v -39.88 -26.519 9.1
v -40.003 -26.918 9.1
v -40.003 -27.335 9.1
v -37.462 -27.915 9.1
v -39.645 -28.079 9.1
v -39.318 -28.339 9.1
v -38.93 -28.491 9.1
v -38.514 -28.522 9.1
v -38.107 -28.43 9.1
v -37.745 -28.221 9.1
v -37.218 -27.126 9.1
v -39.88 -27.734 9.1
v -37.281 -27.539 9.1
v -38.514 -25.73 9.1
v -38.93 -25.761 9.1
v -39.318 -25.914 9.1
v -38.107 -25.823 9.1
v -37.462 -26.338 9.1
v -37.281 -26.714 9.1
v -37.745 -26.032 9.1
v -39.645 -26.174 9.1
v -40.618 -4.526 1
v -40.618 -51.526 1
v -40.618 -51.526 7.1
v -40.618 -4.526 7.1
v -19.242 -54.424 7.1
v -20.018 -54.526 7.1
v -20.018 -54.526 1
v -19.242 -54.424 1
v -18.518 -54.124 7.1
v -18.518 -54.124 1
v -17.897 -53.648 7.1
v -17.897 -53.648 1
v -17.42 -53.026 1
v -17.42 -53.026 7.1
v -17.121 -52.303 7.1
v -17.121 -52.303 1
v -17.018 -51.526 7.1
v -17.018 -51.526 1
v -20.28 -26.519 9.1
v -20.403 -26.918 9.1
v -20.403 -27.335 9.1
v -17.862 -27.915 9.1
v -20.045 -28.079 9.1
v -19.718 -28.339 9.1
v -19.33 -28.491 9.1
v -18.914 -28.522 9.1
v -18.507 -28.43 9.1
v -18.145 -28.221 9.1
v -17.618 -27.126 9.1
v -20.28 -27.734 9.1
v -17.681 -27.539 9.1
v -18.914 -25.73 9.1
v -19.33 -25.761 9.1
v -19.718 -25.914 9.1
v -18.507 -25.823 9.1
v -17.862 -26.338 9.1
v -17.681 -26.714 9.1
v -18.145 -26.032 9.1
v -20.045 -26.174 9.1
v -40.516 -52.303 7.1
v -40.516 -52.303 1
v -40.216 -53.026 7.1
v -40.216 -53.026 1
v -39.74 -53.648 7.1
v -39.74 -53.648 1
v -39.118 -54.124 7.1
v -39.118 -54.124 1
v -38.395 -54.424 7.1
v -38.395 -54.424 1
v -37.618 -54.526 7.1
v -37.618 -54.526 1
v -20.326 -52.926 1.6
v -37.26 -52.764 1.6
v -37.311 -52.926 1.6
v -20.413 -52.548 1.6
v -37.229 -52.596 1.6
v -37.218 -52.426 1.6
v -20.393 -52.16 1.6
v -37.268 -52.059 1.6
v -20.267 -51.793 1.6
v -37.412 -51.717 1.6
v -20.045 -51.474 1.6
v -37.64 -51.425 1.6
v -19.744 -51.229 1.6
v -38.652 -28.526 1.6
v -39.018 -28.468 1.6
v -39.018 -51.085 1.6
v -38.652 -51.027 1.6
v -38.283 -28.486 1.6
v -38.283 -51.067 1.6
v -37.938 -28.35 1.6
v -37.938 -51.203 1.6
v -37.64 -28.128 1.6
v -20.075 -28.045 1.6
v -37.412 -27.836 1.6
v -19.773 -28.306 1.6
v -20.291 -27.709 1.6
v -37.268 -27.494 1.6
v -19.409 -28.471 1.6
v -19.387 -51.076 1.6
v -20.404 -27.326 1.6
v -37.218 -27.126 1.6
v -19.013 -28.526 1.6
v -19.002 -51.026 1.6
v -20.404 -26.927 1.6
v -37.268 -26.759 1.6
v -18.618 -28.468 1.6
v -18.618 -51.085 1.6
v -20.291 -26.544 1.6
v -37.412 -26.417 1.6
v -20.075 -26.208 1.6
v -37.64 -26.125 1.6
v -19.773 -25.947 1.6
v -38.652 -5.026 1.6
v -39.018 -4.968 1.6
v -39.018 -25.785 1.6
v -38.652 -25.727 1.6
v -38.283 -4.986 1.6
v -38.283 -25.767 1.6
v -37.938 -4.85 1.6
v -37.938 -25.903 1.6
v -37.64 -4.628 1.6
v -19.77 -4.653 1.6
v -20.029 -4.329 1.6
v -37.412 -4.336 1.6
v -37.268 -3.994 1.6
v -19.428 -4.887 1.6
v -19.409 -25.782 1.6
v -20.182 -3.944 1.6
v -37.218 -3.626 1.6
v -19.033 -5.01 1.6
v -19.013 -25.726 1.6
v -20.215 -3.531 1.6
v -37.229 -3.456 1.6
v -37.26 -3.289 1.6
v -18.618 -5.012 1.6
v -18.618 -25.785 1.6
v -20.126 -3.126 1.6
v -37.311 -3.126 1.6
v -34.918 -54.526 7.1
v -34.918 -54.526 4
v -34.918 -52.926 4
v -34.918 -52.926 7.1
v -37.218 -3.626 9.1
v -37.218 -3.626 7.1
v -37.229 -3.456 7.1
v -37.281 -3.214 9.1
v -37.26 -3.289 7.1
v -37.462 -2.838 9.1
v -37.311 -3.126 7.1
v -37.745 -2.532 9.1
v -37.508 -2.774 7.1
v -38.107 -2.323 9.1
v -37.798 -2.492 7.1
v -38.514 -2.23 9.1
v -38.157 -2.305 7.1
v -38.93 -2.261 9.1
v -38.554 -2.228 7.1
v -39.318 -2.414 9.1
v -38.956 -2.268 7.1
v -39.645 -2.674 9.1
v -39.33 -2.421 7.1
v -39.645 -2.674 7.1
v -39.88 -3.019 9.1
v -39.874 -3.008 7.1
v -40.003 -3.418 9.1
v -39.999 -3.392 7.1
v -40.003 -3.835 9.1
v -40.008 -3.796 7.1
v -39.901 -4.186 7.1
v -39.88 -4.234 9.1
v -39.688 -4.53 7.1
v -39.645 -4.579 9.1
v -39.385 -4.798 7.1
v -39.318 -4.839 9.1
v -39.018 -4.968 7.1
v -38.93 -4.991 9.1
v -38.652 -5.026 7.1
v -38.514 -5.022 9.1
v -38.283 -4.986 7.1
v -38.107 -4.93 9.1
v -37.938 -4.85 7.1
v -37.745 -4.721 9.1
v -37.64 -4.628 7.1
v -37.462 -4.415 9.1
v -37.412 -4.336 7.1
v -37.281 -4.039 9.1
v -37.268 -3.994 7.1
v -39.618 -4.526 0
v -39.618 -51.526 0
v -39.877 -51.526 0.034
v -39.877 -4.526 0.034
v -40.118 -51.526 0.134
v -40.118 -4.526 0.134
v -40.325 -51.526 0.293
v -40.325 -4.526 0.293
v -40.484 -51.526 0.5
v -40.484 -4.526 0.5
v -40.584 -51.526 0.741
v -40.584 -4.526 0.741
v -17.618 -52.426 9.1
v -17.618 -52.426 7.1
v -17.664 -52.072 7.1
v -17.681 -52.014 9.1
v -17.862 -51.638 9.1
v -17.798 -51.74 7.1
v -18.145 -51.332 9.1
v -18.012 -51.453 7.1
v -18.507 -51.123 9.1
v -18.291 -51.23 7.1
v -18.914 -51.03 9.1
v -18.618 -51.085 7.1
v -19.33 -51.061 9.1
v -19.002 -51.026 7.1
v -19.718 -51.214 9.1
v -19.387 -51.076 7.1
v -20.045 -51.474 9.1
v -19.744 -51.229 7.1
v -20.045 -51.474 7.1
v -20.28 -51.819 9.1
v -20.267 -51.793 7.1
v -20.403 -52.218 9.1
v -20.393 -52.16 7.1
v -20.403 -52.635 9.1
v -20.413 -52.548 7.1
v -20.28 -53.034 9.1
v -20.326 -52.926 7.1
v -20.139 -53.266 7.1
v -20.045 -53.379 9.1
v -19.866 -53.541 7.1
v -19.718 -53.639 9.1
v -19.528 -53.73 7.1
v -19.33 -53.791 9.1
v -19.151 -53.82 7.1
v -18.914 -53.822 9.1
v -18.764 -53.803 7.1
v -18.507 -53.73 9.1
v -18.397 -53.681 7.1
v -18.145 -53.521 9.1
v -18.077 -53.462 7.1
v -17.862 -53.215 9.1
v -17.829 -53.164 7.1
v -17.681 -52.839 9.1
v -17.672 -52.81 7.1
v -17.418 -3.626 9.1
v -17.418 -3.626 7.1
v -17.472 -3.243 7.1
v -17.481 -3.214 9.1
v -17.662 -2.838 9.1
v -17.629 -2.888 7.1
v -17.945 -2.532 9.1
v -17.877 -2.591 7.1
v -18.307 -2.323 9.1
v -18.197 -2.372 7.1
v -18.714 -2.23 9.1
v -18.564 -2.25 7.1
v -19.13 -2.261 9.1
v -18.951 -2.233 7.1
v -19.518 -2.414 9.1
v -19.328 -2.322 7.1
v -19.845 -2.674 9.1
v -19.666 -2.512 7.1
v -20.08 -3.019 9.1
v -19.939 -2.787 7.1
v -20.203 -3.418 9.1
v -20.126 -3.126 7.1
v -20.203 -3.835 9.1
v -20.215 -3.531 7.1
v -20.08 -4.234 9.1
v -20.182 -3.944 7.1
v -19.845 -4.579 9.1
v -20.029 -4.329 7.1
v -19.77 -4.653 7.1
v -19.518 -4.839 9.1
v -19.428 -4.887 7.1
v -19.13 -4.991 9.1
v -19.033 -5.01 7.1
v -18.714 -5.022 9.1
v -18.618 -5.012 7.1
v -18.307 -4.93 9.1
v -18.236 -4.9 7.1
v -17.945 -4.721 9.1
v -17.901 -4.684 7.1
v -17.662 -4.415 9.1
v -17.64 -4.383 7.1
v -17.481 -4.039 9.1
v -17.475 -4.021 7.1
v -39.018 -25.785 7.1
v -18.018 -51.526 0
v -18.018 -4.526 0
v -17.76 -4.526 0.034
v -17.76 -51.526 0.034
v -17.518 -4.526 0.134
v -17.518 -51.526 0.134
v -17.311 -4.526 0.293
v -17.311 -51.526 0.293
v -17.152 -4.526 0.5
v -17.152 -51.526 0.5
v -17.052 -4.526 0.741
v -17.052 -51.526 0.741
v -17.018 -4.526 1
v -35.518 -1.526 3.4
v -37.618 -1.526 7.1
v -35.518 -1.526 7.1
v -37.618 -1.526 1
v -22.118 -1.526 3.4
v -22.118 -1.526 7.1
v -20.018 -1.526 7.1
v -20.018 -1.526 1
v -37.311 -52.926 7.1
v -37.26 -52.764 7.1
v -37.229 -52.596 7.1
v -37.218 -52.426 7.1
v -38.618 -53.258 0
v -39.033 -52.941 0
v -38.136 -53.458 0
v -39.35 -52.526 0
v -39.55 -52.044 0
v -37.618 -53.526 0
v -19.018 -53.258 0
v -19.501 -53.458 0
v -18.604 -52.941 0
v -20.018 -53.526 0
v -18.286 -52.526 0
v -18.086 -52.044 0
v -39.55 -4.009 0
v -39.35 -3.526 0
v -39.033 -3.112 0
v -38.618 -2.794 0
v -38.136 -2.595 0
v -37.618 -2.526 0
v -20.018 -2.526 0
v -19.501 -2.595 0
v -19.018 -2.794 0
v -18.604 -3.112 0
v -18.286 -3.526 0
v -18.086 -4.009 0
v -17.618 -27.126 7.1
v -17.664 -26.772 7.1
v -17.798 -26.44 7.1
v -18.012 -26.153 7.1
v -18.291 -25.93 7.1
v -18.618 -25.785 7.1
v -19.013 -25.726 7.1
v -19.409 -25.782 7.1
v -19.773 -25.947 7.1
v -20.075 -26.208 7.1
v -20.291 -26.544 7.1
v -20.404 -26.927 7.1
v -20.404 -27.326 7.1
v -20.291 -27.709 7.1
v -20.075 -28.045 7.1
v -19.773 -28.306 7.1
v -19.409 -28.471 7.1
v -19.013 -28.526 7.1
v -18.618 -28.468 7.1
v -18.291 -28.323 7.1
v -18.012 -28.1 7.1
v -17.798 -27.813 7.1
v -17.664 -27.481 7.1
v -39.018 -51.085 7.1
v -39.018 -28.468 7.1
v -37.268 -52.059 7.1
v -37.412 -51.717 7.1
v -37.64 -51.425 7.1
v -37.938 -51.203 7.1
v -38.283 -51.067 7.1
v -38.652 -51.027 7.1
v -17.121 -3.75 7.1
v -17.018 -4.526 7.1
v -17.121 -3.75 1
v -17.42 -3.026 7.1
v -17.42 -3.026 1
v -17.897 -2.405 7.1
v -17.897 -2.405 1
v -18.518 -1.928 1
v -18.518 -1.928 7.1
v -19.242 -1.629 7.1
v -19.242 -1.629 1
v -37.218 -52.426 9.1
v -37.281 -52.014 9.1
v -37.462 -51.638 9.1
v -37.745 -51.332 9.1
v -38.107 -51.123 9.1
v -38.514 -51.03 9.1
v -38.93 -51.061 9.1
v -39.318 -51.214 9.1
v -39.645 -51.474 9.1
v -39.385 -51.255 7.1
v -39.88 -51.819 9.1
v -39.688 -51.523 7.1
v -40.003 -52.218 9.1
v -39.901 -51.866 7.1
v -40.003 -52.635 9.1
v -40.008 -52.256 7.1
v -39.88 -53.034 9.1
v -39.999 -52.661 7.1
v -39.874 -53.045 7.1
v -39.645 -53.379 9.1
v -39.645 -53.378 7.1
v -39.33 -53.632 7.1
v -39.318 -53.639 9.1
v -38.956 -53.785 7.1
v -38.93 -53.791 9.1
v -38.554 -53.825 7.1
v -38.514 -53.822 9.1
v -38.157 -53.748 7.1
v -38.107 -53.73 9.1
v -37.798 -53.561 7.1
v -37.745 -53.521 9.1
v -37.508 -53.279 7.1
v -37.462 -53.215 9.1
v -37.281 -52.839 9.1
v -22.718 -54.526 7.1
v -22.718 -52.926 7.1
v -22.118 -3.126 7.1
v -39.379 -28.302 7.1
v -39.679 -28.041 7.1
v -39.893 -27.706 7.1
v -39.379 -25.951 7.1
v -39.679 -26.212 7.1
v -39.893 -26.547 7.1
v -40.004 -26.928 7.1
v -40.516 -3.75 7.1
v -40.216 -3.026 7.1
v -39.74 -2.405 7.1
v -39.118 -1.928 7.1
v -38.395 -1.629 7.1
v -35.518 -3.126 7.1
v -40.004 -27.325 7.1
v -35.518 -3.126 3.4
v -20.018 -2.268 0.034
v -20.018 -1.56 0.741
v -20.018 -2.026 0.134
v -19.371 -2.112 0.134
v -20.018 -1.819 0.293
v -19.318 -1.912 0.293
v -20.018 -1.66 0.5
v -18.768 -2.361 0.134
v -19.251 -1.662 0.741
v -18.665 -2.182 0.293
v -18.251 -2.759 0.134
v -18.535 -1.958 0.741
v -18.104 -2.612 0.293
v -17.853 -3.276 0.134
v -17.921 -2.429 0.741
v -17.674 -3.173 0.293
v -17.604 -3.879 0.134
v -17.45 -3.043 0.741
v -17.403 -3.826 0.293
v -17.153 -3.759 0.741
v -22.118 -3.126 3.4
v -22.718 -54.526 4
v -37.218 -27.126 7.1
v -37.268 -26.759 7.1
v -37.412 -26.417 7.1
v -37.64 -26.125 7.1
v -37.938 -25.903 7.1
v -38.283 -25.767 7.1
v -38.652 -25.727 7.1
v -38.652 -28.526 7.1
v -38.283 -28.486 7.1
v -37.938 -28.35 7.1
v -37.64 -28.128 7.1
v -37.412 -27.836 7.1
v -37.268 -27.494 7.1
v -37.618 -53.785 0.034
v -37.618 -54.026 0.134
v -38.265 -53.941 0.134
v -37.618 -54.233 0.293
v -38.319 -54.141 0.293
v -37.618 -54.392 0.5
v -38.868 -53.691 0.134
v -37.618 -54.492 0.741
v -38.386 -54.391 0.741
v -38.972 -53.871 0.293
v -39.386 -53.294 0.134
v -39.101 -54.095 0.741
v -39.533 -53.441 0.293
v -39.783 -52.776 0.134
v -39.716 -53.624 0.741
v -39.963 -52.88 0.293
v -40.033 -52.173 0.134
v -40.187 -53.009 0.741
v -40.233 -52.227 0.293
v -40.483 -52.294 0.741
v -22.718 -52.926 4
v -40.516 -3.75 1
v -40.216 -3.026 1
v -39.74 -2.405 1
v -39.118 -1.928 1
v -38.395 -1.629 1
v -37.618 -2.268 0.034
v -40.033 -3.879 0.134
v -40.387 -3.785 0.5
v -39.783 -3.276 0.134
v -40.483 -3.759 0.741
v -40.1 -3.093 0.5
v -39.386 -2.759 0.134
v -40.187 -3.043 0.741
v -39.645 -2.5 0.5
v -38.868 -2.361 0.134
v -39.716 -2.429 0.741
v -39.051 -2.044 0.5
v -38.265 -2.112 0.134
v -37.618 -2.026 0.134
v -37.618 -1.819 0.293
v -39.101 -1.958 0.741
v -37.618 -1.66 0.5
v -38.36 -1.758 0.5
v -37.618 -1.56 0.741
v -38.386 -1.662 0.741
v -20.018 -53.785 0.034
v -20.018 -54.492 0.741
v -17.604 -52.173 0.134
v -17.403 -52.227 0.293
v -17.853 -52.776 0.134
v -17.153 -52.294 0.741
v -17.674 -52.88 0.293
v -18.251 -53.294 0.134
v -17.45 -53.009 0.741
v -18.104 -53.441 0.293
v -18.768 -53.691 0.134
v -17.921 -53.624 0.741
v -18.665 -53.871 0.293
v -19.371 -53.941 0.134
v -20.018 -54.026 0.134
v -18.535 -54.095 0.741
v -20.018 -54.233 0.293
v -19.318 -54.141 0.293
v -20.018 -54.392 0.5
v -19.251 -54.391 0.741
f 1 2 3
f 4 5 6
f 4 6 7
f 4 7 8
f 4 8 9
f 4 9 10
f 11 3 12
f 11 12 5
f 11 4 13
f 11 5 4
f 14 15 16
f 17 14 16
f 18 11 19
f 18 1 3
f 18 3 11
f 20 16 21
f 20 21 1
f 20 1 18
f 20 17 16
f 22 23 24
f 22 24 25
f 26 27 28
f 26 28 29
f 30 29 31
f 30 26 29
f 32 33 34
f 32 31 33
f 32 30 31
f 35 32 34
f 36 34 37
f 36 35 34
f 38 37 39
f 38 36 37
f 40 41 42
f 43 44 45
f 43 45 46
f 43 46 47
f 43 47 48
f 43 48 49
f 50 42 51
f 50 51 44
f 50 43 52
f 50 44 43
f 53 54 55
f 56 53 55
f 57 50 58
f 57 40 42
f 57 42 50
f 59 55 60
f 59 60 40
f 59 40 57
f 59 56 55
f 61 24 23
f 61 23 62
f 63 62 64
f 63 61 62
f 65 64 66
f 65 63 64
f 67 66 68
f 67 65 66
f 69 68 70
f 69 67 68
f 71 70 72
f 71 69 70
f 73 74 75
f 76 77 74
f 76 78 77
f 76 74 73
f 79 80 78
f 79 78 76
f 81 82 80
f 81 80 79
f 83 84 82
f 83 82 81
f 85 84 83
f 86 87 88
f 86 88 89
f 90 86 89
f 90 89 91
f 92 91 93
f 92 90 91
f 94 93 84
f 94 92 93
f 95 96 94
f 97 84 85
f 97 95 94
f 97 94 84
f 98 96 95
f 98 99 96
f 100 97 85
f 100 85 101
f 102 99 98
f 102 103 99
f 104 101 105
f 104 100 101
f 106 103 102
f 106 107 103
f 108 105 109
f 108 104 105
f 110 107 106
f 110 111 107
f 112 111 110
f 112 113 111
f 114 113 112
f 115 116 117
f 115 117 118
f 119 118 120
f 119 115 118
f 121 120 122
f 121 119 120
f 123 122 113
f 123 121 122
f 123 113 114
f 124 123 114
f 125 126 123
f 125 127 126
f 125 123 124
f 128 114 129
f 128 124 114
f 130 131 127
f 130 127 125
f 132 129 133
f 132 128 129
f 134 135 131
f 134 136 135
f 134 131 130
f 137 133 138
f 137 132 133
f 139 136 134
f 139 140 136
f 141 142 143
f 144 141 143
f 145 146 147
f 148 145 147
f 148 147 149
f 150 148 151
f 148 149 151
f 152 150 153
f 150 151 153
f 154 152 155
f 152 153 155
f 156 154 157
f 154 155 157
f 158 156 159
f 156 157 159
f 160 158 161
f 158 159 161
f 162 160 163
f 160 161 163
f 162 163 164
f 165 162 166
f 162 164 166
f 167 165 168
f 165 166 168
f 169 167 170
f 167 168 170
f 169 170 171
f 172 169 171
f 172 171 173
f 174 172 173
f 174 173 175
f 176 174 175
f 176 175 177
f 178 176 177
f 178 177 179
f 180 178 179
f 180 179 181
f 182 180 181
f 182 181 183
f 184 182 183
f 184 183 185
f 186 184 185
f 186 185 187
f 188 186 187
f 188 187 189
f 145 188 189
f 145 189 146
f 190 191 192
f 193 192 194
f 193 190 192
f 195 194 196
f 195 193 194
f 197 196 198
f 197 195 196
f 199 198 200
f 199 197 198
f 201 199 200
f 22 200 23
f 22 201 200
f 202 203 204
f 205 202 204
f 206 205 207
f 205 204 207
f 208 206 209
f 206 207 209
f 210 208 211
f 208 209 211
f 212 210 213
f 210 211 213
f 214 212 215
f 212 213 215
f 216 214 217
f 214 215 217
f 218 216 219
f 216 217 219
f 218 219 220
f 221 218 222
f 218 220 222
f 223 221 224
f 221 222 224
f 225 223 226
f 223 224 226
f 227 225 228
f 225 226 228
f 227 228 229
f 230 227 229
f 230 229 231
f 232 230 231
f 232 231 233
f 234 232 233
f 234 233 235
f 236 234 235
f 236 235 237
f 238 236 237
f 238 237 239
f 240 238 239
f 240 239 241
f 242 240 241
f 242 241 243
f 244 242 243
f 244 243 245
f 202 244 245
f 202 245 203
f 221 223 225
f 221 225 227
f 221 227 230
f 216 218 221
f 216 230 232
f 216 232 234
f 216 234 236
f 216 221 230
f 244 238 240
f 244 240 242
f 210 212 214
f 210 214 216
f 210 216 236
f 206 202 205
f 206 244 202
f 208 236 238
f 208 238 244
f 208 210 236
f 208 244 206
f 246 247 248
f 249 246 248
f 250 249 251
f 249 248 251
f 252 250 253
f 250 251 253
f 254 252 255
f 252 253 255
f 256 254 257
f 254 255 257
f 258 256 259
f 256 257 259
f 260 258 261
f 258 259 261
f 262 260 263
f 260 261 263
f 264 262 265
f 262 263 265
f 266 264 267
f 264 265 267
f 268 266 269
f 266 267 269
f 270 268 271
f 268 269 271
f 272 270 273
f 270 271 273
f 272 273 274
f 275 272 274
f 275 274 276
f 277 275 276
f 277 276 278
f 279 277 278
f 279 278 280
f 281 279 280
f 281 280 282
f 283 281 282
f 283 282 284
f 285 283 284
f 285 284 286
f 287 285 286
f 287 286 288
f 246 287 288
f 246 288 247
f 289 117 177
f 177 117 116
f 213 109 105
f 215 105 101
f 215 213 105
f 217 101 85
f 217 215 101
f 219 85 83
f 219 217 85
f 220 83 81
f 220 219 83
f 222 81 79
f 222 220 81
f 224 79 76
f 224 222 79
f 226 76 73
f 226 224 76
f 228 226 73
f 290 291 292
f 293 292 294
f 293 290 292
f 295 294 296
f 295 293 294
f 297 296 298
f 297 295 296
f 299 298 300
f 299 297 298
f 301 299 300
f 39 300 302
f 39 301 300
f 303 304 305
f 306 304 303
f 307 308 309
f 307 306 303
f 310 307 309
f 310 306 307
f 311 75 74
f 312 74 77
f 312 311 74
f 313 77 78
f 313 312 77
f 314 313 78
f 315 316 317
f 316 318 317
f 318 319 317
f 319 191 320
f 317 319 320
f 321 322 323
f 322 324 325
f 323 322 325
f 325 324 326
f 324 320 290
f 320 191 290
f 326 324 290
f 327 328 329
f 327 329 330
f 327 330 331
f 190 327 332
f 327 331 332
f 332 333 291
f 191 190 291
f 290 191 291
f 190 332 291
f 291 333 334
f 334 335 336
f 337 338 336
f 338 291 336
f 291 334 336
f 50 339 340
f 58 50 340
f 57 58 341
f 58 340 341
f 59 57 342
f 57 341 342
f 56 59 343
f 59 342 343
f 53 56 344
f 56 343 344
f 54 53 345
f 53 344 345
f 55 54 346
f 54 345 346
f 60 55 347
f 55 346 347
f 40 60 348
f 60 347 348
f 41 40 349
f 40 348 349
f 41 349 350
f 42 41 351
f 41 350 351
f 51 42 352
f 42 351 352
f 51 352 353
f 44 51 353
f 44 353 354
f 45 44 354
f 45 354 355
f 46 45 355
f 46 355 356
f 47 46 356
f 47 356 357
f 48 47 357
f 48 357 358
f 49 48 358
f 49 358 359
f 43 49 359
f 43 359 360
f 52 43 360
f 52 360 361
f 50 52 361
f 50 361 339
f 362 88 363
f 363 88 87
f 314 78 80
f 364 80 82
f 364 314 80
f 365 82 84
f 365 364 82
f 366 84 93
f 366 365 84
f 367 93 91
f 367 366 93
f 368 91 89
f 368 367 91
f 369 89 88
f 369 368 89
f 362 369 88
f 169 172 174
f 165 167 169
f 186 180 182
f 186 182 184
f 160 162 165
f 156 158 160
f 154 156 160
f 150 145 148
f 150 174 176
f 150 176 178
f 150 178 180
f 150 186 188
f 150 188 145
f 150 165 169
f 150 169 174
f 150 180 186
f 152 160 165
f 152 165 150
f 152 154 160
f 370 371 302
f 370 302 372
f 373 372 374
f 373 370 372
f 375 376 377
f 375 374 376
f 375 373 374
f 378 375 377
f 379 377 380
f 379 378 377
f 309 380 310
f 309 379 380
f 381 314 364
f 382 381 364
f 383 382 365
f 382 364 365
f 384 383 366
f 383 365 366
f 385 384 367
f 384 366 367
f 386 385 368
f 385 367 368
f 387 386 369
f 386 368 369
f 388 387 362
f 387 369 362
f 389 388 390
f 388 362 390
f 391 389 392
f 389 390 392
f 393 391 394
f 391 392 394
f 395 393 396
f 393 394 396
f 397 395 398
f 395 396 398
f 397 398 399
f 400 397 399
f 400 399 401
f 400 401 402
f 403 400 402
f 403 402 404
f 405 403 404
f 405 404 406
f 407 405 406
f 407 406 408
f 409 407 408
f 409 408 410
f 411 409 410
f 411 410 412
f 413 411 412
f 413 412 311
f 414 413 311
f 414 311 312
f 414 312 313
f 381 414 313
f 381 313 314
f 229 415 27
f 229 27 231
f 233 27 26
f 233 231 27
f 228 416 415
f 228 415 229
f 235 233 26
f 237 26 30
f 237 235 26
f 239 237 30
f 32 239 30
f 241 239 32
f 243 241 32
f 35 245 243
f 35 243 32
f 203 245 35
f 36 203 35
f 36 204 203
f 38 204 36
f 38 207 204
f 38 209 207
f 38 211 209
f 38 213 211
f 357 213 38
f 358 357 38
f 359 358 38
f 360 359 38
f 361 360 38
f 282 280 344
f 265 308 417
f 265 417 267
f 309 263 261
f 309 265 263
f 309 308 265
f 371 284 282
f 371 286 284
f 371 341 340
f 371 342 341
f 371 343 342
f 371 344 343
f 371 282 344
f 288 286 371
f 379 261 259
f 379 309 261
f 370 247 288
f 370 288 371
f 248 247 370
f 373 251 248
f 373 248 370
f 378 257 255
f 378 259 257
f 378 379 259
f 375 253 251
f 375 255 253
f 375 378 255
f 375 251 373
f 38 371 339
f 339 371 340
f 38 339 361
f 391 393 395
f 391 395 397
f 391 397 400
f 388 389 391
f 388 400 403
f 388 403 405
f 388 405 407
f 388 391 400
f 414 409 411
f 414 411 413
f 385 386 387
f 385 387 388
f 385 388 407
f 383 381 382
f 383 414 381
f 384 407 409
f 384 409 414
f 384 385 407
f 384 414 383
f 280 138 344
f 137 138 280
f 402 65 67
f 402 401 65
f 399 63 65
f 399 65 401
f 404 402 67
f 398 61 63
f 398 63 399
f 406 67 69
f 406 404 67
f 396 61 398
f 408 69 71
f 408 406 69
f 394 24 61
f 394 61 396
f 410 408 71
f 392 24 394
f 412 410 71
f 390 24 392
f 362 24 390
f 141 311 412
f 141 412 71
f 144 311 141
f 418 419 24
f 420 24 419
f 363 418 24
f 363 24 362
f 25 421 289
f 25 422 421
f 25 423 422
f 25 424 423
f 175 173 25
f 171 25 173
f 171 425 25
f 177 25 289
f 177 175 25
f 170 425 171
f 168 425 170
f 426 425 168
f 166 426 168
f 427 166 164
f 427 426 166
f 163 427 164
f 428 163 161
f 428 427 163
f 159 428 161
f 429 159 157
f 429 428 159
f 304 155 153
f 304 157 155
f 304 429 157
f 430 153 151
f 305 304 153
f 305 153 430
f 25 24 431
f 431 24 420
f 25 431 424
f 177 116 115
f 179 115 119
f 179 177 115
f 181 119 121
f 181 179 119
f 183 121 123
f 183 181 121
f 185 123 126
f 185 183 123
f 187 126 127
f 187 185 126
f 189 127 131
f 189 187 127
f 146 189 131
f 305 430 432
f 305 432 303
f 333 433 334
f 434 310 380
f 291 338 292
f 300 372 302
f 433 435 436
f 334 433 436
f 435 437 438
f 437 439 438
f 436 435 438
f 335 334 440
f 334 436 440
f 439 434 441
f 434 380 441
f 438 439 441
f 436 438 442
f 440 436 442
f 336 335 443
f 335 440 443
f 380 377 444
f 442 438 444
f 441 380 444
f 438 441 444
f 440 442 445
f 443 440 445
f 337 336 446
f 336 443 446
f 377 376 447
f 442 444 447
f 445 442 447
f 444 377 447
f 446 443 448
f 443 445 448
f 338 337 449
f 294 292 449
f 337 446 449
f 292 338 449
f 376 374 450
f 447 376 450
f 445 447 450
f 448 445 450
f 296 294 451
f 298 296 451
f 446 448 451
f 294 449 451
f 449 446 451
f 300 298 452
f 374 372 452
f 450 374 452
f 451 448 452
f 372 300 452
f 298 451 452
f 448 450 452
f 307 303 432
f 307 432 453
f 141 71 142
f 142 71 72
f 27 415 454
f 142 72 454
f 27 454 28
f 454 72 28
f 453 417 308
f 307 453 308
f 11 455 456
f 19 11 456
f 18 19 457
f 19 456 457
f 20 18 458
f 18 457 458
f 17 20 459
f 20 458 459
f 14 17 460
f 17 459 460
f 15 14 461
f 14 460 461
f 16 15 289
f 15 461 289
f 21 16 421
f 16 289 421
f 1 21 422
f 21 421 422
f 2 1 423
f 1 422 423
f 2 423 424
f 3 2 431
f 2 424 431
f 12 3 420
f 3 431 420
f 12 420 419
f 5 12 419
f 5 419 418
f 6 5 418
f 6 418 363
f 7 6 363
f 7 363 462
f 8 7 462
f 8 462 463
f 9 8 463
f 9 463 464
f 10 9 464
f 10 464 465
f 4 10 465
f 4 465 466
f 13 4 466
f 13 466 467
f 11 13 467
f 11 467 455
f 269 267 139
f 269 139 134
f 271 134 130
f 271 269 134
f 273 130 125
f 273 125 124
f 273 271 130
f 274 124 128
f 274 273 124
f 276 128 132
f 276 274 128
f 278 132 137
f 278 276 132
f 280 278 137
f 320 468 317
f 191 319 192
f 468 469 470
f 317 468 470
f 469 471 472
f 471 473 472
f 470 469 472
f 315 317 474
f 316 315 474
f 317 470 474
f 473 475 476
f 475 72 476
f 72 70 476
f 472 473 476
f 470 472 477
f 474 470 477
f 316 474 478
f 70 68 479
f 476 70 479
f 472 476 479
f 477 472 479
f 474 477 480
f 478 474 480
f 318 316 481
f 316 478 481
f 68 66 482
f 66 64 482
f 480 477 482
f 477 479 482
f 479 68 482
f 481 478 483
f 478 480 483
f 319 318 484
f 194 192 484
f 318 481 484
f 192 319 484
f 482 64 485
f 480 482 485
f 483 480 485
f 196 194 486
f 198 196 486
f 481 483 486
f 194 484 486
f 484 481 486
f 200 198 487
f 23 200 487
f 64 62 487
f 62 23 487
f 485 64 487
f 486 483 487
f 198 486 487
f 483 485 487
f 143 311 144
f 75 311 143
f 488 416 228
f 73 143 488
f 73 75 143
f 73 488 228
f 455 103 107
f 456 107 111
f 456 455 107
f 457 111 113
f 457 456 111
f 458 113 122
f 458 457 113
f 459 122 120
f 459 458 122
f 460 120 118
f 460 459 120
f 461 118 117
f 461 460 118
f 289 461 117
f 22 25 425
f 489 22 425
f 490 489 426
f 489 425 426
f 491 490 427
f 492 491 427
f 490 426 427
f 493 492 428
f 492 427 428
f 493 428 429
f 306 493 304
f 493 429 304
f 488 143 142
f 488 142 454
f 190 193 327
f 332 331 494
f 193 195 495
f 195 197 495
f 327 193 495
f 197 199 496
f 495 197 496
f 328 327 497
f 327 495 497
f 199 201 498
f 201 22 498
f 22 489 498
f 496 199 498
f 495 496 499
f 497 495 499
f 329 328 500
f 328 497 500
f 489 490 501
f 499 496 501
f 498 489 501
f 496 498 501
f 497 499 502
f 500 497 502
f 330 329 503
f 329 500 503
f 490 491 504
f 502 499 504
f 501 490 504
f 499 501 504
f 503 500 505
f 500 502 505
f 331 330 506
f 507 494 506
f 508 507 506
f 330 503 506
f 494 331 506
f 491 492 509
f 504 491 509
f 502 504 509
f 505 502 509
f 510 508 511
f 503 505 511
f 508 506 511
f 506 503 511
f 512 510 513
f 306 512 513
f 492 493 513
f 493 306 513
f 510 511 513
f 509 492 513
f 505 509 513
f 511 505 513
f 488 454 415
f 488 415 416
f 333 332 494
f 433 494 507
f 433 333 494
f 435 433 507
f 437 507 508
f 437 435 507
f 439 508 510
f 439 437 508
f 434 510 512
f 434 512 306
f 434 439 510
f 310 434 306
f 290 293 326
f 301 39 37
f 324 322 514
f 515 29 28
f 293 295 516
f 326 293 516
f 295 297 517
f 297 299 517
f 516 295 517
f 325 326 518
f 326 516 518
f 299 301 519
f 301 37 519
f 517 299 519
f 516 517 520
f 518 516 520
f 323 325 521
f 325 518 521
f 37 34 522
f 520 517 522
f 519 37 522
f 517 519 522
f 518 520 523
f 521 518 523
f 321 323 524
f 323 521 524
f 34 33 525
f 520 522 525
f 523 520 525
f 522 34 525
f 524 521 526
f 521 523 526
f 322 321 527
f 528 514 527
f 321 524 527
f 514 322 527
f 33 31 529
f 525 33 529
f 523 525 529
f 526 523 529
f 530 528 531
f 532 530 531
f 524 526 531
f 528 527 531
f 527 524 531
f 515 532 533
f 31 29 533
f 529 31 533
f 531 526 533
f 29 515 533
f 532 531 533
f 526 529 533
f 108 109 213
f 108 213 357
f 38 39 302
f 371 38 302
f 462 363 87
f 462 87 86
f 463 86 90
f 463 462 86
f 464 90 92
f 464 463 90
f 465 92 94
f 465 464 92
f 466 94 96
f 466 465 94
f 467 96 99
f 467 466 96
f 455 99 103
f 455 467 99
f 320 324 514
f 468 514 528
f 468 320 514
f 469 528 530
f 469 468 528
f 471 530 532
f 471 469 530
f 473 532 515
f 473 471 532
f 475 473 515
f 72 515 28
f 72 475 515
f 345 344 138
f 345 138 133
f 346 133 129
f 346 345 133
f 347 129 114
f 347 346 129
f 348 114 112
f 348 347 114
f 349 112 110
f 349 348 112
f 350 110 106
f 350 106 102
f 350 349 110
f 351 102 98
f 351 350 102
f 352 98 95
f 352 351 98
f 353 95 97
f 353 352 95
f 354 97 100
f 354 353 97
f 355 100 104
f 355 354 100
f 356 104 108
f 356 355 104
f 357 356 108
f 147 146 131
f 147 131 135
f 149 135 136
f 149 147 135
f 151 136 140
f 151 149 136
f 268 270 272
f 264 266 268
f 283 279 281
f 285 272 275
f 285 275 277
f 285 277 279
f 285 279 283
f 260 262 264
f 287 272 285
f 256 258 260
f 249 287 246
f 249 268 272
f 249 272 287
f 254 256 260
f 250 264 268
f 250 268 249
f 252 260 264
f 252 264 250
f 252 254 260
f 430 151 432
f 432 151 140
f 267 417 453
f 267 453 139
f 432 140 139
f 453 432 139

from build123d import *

# Parameters (mm, degrees)
SKETCH1_W                = 23.6
SKETCH1_H                = 53
BOSS_EXTRUDE2_DEPTH      = 7.1
SHELL1_T                 = -1.6
FILLET2_R                = 3
SKETCH7_W                = 12.2
SKETCH7_H                = 1.6
CUT_EXTRUDE1_DEPTH       = 3.1
SKETCH8_W                = 13.4
SKETCH8_H                = 1.6
CUT_EXTRUDE2_DEPTH       = 3.7
FILLET3_R                = 1
SKETCH10_R               = 1.4
BOSS_EXTRUDE4_DEPTH      = 2
BOSS_EXTRUDE4_DEPTH_BACK = 6.5


with BuildPart() as part:
    # Sketch1 → Boss-Extrude2 (new body)
    with BuildSketch(Plane.XY):
        with Locations((-28.818351302, -28.026390465)):
            Rectangle(SKETCH1_W, SKETCH1_H)
    extrude(amount=BOSS_EXTRUDE2_DEPTH)

    # Shell1
    shell1_openings = [part.faces().sort_by_distance(p)[0] for p in [
        (-28.818351302, -28.026390465, 7.1),
    ]]
    offset(amount=SHELL1_T, openings=shell1_openings, kind=Kind.INTERSECTION)

    # Fillet2
    fillet2_edges = [part.edges().sort_by_distance(p)[0] for p in [
        (-40.618351302, -1.526390465, 3.55),
        (-17.018351302, -1.526390465, 3.55),
        (-17.018351302, -54.526390465, 3.55),
        (-40.618351302, -54.526390465, 3.55),
    ]]
    fillet(fillet2_edges, radius=FILLET2_R)

    # Sketch7 → Cut-Extrude1 (cut)
    with BuildSketch(Plane.XY.offset(7.1)):
        with Locations((-28.818351302, -53.726390465)):
            Rectangle(SKETCH7_W, SKETCH7_H)
    extrude(amount=-CUT_EXTRUDE1_DEPTH, mode=Mode.SUBTRACT)

    # Sketch8 → Cut-Extrude2 (cut)
    with BuildSketch(Plane.XY.offset(7.1)):
        with Locations((-28.818351302, -2.326390465)):
            Rectangle(SKETCH8_W, SKETCH8_H)
    extrude(amount=-CUT_EXTRUDE2_DEPTH, mode=Mode.SUBTRACT)

    # Fillet3
    fillet3_edges = [part.edges().sort_by_distance(p)[0] for p in [
        (-28.818351302, -1.526390465, 0),
        (-40.618351302, -28.026390465, 0),
        (-17.018351302, -28.026390465, 0),
        (-28.818351302, -54.526390465, 0),
        (-39.739671646, -2.405070122, 0),
        (-39.739671646, -53.647710809, 0),
        (-17.897030959, -53.647710809, 0),
        (-17.897030959, -2.405070122, 0),
    ]]
    fillet(fillet3_edges, radius=FILLET3_R)

    # Sketch10 → Boss-Extrude4 (add, two sides)
    with BuildSketch(Plane.XY.offset(7.1)) as boss_extrude4_sk:
        with Locations((-38.618351302, -52.426390465)):
            Circle(SKETCH10_R)
        with Locations((-19.018351302, -52.426390465)):
            Circle(SKETCH10_R)
        with Locations((-38.618351302, -27.126390465)):
            Circle(SKETCH10_R)
        with Locations((-19.018351302, -27.126390465)):
            Circle(SKETCH10_R)
        with Locations((-18.818351302, -3.626390465)):
            Circle(SKETCH10_R)
        with Locations((-38.618351302, -3.626390465)):
            Circle(SKETCH10_R)
    extrude(amount=BOSS_EXTRUDE4_DEPTH)
    extrude(boss_extrude4_sk.sketch, amount=-BOSS_EXTRUDE4_DEPTH_BACK)


solid = part.part
